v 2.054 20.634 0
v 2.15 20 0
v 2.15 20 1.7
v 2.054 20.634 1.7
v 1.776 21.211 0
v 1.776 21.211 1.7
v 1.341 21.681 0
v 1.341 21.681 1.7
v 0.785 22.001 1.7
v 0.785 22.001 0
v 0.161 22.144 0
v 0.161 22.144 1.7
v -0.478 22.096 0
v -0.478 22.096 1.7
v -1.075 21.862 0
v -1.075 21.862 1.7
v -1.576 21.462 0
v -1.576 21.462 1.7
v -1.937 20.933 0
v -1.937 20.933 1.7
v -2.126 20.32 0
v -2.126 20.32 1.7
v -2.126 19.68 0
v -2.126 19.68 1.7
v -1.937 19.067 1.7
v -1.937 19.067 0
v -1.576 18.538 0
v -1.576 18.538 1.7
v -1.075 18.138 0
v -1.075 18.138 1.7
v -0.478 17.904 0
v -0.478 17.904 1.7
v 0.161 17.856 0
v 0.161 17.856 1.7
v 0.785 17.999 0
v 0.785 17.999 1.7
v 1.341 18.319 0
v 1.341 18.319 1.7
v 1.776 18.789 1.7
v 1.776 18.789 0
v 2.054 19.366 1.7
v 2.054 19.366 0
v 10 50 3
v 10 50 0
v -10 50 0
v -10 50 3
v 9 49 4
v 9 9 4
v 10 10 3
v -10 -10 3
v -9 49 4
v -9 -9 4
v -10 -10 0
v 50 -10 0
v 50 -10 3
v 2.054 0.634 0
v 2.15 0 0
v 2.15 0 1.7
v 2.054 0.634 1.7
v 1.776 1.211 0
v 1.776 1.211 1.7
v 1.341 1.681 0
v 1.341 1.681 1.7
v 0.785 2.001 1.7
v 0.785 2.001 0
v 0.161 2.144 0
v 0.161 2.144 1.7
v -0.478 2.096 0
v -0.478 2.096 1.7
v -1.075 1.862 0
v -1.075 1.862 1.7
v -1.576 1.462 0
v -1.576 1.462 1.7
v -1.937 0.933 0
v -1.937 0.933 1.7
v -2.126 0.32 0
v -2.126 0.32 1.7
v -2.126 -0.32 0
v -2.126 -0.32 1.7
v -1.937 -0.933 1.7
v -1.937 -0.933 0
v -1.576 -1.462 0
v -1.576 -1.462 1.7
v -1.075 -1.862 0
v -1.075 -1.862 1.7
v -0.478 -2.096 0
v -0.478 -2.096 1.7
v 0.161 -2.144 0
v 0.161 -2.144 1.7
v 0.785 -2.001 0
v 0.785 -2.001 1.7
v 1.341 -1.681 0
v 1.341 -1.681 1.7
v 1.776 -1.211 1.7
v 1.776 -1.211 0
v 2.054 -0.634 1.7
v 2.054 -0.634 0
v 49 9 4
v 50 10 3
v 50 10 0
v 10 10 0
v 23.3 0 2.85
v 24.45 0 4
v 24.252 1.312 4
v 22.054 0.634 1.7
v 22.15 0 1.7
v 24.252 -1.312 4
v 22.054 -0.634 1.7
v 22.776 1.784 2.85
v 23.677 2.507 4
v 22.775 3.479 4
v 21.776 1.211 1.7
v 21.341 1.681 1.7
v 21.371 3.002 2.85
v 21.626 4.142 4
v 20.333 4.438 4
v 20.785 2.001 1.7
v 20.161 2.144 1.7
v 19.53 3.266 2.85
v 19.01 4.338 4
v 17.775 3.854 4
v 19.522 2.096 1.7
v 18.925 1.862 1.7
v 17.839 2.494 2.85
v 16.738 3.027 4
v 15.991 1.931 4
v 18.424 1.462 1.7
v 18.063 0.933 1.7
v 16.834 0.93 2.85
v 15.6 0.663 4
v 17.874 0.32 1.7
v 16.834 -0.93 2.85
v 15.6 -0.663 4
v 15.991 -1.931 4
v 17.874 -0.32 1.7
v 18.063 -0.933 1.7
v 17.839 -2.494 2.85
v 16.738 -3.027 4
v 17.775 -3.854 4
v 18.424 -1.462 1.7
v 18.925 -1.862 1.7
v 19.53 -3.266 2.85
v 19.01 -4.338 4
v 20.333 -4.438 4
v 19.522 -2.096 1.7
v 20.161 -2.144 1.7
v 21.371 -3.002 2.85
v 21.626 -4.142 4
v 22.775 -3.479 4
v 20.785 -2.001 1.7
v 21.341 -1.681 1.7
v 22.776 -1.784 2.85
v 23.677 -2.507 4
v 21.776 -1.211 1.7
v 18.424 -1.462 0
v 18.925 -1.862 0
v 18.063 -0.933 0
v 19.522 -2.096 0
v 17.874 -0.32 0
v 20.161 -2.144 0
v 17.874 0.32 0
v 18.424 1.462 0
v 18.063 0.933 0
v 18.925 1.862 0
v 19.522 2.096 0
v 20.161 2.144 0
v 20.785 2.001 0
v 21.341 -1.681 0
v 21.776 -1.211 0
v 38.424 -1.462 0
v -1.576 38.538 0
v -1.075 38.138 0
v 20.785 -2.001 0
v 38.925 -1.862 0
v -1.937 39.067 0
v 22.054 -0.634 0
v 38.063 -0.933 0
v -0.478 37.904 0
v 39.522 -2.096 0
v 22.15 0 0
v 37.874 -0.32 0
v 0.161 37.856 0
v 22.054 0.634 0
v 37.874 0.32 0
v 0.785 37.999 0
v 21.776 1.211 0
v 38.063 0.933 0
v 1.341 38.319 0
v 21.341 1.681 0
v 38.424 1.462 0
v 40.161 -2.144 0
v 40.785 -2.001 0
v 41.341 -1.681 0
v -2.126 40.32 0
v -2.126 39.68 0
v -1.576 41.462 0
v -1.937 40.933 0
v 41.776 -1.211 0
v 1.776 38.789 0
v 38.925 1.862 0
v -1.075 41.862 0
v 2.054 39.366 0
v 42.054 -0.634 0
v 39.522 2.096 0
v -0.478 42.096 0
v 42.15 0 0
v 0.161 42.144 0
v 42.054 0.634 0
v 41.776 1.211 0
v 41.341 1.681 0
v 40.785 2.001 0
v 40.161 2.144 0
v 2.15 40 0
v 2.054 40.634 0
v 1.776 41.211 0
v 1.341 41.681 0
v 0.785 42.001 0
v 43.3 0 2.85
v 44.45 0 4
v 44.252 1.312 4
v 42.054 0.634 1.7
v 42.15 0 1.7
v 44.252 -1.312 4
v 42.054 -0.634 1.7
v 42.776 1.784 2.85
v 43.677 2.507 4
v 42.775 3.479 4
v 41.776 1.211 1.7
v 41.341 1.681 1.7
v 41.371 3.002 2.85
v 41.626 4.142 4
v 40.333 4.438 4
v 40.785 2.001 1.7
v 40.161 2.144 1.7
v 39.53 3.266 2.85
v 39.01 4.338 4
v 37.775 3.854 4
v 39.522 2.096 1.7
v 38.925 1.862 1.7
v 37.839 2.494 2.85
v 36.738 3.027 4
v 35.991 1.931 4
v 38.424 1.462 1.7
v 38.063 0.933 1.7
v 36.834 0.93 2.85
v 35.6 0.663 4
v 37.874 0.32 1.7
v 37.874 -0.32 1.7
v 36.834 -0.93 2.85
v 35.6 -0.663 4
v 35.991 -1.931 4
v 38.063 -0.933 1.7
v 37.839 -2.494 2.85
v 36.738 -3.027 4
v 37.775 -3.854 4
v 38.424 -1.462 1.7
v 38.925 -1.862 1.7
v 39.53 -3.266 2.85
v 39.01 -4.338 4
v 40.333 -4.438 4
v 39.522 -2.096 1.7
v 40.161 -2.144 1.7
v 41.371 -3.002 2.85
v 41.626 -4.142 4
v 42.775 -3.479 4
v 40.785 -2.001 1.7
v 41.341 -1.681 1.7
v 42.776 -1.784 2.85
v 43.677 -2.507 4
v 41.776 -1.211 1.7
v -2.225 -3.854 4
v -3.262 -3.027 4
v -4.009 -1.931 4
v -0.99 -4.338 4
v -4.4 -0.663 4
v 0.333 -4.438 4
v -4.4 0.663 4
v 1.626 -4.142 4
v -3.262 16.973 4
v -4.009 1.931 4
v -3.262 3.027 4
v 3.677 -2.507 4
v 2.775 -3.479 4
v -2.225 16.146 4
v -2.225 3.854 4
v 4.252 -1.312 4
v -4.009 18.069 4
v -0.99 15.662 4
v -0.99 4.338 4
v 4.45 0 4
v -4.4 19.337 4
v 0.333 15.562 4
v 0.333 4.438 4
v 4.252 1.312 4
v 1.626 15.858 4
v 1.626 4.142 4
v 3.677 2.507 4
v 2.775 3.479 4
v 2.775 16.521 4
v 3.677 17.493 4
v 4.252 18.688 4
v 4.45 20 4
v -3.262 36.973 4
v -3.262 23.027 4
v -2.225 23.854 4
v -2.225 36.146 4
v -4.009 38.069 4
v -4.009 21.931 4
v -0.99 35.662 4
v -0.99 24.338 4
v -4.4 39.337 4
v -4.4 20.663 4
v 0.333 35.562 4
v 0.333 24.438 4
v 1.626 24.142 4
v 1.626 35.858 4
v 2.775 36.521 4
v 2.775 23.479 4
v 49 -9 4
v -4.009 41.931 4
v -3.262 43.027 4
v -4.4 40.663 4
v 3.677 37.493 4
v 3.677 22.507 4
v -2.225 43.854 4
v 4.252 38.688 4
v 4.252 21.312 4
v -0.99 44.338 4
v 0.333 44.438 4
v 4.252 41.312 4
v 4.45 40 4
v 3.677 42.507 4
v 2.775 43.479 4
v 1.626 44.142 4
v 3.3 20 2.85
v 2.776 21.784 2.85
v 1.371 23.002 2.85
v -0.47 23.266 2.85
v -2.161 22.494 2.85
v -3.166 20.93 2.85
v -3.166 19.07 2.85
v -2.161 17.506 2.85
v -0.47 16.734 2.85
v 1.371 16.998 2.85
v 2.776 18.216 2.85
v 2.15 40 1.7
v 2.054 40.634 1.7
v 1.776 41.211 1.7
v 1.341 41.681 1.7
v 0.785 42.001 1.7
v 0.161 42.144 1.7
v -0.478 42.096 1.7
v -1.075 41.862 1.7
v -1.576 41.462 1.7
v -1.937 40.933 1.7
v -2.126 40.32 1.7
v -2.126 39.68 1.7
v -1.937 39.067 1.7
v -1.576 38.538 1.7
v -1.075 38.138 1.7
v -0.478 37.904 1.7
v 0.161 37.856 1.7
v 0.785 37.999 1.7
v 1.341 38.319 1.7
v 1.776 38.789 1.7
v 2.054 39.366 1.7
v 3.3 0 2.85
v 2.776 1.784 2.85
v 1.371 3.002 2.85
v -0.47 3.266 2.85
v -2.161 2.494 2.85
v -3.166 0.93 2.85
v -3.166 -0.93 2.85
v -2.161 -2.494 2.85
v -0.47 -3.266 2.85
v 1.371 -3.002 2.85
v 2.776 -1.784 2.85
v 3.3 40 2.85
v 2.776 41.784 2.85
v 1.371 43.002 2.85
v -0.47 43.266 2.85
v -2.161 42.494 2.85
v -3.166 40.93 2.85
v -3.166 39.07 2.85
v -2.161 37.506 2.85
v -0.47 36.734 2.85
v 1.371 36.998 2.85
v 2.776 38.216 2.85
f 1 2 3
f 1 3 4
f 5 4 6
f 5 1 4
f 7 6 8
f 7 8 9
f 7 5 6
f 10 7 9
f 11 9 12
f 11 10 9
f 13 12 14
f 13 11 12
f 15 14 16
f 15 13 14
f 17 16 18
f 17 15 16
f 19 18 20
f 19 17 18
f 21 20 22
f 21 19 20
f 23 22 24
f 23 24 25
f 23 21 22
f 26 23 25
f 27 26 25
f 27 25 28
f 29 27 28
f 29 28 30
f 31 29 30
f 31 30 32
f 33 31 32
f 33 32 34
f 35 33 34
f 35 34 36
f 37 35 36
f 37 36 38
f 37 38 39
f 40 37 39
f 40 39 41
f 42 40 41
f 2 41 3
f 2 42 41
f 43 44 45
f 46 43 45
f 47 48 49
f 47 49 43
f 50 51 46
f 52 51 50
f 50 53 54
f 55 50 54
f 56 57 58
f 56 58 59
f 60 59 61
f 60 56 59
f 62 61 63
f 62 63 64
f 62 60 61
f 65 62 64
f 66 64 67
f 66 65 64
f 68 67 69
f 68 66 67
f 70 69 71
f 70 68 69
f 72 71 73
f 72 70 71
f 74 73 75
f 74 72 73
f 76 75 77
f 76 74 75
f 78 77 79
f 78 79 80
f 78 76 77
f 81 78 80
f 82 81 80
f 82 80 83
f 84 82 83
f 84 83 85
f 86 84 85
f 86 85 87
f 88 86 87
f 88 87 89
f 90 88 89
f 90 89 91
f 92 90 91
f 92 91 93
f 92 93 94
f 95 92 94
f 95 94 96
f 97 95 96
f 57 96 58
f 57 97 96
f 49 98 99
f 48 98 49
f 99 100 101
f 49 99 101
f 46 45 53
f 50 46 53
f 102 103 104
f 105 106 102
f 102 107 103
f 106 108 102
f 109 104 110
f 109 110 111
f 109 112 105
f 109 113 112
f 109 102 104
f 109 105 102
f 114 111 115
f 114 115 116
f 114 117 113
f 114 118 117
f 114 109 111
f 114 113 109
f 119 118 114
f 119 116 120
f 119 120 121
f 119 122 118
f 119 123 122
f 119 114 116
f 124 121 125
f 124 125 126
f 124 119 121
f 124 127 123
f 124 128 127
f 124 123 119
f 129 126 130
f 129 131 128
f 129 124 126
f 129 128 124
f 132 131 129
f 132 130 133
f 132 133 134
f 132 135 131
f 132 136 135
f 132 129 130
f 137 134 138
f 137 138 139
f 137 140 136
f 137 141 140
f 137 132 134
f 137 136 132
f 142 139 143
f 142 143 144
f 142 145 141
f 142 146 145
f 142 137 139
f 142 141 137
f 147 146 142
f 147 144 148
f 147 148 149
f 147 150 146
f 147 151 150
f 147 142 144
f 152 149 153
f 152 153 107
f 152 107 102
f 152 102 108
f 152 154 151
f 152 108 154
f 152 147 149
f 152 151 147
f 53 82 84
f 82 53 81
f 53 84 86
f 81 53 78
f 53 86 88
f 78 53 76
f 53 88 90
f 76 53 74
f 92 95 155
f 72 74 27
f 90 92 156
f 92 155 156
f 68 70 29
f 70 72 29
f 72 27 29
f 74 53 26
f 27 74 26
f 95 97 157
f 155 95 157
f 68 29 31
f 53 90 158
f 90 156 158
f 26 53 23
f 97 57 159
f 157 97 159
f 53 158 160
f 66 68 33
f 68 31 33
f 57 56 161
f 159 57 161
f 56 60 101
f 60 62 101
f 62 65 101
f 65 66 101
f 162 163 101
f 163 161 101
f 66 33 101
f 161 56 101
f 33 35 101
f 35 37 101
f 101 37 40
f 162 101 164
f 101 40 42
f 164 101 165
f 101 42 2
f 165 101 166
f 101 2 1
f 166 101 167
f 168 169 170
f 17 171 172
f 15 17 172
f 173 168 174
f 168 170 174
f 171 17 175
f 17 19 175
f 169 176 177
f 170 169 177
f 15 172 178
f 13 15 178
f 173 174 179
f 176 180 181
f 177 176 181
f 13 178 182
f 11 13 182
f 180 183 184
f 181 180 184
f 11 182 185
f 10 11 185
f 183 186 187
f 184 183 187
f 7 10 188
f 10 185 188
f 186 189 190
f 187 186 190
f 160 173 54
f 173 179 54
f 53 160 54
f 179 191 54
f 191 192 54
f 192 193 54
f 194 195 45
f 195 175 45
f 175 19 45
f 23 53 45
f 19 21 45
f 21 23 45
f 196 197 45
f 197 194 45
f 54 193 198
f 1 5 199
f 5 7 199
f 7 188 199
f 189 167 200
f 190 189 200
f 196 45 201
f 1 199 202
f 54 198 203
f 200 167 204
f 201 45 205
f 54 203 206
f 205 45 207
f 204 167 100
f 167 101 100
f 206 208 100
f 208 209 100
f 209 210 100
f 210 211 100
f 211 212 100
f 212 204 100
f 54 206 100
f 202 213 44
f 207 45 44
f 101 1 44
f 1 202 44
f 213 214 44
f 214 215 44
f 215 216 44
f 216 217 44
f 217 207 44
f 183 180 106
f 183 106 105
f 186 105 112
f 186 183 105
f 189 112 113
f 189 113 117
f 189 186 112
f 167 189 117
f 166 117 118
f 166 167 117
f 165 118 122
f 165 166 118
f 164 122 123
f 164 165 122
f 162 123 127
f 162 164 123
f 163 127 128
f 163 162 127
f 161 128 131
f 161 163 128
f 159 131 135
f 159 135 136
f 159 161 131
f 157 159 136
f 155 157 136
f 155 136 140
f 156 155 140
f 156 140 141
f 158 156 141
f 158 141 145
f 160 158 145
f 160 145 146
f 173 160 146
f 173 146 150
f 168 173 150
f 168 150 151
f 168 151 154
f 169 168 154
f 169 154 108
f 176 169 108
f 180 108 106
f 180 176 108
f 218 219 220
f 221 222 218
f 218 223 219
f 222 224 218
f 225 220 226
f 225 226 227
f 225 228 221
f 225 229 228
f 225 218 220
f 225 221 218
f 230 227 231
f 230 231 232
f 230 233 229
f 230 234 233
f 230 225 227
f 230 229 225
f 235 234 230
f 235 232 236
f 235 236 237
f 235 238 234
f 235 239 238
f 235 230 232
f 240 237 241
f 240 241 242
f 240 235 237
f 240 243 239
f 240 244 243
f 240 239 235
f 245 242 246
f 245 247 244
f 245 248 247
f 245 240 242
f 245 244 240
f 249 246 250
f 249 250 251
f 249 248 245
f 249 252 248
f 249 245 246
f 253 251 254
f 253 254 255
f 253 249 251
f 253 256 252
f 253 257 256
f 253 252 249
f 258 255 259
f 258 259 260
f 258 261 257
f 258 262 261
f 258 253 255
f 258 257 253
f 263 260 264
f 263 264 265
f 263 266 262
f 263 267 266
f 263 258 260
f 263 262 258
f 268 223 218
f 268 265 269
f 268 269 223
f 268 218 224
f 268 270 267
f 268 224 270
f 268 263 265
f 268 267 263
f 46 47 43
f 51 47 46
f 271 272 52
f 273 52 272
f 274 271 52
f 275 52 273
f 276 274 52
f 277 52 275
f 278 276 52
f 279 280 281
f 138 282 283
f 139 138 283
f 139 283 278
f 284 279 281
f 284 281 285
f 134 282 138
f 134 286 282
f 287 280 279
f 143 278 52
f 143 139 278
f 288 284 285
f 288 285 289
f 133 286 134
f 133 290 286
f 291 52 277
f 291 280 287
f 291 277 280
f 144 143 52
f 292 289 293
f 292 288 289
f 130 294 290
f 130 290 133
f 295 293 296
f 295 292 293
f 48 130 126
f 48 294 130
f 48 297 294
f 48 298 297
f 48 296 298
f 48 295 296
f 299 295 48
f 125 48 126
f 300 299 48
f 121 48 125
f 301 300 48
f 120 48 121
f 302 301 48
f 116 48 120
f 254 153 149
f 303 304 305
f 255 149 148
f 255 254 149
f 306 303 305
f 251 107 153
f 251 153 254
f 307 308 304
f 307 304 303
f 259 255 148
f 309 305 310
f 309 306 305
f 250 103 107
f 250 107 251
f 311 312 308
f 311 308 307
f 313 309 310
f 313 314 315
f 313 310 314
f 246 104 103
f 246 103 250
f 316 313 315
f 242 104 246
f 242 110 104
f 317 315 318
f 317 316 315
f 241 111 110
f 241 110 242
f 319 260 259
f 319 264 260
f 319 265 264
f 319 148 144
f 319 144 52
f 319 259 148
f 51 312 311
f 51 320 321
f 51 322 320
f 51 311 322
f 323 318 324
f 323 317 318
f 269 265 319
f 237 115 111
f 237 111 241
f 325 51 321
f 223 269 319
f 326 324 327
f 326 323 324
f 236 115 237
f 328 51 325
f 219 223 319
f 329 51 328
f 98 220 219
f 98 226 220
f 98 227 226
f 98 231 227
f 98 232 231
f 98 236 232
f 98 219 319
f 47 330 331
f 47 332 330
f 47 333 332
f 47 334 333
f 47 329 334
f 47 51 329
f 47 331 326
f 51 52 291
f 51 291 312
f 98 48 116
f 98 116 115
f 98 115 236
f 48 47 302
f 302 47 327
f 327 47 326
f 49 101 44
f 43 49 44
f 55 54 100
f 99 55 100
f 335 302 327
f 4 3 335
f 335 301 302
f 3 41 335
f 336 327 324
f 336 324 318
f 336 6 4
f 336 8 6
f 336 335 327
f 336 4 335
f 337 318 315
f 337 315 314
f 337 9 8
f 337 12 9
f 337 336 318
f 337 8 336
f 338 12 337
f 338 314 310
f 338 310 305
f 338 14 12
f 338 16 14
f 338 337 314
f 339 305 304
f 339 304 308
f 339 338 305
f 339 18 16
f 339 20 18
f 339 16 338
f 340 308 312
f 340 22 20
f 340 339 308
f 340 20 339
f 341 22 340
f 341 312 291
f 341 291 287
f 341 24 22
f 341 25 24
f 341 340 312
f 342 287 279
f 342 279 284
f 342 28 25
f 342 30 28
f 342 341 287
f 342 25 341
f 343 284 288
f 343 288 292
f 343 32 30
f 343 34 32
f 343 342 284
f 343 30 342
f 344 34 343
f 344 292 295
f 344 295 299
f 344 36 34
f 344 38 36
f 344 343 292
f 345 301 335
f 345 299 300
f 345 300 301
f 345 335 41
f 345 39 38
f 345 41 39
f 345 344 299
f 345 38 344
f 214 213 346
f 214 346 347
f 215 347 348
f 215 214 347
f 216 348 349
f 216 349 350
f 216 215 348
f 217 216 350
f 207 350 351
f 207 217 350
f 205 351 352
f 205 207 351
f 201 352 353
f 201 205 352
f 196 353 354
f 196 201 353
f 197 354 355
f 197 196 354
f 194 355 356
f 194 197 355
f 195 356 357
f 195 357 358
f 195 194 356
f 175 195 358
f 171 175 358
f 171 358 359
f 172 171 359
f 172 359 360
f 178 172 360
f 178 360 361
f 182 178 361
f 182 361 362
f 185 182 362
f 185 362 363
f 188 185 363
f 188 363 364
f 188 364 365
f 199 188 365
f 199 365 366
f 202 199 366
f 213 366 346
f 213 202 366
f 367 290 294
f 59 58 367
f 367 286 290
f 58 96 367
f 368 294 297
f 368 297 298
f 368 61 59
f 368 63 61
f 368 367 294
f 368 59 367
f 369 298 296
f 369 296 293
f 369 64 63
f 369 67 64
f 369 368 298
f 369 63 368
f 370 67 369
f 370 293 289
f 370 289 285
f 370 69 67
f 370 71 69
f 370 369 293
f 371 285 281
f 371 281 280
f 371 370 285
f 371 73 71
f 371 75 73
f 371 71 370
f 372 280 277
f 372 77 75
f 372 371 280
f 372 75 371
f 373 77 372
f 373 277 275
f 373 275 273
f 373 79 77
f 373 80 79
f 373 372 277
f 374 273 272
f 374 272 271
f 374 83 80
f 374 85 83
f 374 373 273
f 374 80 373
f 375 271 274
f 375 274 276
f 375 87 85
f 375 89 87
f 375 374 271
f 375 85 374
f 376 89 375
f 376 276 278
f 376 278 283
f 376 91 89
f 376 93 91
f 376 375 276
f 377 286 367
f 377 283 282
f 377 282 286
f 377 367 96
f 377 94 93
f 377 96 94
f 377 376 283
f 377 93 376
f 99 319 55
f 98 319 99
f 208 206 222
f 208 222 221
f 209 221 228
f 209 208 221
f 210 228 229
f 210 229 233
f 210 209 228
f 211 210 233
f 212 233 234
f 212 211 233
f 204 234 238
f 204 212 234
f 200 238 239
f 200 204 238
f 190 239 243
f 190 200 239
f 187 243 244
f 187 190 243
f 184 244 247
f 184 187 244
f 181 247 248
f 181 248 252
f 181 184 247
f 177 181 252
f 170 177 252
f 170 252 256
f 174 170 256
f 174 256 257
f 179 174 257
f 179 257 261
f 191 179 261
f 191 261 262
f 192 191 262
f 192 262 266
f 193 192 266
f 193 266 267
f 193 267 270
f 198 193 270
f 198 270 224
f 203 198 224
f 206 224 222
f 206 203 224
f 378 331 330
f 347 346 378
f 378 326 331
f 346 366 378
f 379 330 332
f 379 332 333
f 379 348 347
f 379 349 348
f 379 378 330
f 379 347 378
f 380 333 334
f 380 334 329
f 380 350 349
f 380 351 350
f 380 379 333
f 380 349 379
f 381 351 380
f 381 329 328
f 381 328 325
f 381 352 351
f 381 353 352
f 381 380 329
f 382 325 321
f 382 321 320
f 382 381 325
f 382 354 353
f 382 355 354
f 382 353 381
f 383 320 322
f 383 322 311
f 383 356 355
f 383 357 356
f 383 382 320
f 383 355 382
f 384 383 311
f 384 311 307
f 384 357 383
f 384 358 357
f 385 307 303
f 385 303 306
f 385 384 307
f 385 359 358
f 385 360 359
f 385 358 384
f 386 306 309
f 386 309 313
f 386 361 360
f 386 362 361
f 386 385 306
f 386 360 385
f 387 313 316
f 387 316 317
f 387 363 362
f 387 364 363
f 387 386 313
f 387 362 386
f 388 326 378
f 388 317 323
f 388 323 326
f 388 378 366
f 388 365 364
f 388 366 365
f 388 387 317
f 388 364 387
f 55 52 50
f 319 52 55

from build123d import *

# Parameters (mm, degrees)
SKETCH1_R           = 2.15
BOSS_EXTRUDE1_DEPTH = 4
CHAMFER1_SIZE       = 1
CHAMFER2_SIZE       = 2.3


with BuildPart() as part:
    # Sketch1 → Boss-Extrude1 (new body)
    with BuildSketch(Plane.XY):
        Polygon((50, -10), (50, 10), (10, 10), (10, 50), (-10, 50), (-10, 10), (-10, -10), align=None)
        with Locations((0, 20)):
            Circle(SKETCH1_R, mode=Mode.SUBTRACT)
        with Locations((20, 0)):
            Circle(SKETCH1_R, mode=Mode.SUBTRACT)
        with Locations((0, 40)):
            Circle(SKETCH1_R, mode=Mode.SUBTRACT)
        Circle(SKETCH1_R, mode=Mode.SUBTRACT)
        with Locations((40, 0)):
            Circle(SKETCH1_R, mode=Mode.SUBTRACT)
    extrude(amount=BOSS_EXTRUDE1_DEPTH)

    # Chamfer1
    chamfer1_edges = [part.edges().sort_by_distance(p)[0] for p in [
        (0, 50, 4),
        (-10, 20, 4),
        (20, -10, 4),
        (50, 0, 4),
        (30, 10, 4),
        (10, 30, 4),
    ]]
    chamfer(chamfer1_edges, length=CHAMFER1_SIZE)

    # Chamfer2
    chamfer2_edges = [part.edges().sort_by_distance(p)[0] for p in [
        (17.85, 0, 4),
        (-2.15, 20, 4),
        (-2.15, 40, 4),
        (-2.15, 0, 4),
        (37.85, 0, 4),
    ]]
    chamfer(chamfer2_edges, length=CHAMFER2_SIZE)


solid = part.part
